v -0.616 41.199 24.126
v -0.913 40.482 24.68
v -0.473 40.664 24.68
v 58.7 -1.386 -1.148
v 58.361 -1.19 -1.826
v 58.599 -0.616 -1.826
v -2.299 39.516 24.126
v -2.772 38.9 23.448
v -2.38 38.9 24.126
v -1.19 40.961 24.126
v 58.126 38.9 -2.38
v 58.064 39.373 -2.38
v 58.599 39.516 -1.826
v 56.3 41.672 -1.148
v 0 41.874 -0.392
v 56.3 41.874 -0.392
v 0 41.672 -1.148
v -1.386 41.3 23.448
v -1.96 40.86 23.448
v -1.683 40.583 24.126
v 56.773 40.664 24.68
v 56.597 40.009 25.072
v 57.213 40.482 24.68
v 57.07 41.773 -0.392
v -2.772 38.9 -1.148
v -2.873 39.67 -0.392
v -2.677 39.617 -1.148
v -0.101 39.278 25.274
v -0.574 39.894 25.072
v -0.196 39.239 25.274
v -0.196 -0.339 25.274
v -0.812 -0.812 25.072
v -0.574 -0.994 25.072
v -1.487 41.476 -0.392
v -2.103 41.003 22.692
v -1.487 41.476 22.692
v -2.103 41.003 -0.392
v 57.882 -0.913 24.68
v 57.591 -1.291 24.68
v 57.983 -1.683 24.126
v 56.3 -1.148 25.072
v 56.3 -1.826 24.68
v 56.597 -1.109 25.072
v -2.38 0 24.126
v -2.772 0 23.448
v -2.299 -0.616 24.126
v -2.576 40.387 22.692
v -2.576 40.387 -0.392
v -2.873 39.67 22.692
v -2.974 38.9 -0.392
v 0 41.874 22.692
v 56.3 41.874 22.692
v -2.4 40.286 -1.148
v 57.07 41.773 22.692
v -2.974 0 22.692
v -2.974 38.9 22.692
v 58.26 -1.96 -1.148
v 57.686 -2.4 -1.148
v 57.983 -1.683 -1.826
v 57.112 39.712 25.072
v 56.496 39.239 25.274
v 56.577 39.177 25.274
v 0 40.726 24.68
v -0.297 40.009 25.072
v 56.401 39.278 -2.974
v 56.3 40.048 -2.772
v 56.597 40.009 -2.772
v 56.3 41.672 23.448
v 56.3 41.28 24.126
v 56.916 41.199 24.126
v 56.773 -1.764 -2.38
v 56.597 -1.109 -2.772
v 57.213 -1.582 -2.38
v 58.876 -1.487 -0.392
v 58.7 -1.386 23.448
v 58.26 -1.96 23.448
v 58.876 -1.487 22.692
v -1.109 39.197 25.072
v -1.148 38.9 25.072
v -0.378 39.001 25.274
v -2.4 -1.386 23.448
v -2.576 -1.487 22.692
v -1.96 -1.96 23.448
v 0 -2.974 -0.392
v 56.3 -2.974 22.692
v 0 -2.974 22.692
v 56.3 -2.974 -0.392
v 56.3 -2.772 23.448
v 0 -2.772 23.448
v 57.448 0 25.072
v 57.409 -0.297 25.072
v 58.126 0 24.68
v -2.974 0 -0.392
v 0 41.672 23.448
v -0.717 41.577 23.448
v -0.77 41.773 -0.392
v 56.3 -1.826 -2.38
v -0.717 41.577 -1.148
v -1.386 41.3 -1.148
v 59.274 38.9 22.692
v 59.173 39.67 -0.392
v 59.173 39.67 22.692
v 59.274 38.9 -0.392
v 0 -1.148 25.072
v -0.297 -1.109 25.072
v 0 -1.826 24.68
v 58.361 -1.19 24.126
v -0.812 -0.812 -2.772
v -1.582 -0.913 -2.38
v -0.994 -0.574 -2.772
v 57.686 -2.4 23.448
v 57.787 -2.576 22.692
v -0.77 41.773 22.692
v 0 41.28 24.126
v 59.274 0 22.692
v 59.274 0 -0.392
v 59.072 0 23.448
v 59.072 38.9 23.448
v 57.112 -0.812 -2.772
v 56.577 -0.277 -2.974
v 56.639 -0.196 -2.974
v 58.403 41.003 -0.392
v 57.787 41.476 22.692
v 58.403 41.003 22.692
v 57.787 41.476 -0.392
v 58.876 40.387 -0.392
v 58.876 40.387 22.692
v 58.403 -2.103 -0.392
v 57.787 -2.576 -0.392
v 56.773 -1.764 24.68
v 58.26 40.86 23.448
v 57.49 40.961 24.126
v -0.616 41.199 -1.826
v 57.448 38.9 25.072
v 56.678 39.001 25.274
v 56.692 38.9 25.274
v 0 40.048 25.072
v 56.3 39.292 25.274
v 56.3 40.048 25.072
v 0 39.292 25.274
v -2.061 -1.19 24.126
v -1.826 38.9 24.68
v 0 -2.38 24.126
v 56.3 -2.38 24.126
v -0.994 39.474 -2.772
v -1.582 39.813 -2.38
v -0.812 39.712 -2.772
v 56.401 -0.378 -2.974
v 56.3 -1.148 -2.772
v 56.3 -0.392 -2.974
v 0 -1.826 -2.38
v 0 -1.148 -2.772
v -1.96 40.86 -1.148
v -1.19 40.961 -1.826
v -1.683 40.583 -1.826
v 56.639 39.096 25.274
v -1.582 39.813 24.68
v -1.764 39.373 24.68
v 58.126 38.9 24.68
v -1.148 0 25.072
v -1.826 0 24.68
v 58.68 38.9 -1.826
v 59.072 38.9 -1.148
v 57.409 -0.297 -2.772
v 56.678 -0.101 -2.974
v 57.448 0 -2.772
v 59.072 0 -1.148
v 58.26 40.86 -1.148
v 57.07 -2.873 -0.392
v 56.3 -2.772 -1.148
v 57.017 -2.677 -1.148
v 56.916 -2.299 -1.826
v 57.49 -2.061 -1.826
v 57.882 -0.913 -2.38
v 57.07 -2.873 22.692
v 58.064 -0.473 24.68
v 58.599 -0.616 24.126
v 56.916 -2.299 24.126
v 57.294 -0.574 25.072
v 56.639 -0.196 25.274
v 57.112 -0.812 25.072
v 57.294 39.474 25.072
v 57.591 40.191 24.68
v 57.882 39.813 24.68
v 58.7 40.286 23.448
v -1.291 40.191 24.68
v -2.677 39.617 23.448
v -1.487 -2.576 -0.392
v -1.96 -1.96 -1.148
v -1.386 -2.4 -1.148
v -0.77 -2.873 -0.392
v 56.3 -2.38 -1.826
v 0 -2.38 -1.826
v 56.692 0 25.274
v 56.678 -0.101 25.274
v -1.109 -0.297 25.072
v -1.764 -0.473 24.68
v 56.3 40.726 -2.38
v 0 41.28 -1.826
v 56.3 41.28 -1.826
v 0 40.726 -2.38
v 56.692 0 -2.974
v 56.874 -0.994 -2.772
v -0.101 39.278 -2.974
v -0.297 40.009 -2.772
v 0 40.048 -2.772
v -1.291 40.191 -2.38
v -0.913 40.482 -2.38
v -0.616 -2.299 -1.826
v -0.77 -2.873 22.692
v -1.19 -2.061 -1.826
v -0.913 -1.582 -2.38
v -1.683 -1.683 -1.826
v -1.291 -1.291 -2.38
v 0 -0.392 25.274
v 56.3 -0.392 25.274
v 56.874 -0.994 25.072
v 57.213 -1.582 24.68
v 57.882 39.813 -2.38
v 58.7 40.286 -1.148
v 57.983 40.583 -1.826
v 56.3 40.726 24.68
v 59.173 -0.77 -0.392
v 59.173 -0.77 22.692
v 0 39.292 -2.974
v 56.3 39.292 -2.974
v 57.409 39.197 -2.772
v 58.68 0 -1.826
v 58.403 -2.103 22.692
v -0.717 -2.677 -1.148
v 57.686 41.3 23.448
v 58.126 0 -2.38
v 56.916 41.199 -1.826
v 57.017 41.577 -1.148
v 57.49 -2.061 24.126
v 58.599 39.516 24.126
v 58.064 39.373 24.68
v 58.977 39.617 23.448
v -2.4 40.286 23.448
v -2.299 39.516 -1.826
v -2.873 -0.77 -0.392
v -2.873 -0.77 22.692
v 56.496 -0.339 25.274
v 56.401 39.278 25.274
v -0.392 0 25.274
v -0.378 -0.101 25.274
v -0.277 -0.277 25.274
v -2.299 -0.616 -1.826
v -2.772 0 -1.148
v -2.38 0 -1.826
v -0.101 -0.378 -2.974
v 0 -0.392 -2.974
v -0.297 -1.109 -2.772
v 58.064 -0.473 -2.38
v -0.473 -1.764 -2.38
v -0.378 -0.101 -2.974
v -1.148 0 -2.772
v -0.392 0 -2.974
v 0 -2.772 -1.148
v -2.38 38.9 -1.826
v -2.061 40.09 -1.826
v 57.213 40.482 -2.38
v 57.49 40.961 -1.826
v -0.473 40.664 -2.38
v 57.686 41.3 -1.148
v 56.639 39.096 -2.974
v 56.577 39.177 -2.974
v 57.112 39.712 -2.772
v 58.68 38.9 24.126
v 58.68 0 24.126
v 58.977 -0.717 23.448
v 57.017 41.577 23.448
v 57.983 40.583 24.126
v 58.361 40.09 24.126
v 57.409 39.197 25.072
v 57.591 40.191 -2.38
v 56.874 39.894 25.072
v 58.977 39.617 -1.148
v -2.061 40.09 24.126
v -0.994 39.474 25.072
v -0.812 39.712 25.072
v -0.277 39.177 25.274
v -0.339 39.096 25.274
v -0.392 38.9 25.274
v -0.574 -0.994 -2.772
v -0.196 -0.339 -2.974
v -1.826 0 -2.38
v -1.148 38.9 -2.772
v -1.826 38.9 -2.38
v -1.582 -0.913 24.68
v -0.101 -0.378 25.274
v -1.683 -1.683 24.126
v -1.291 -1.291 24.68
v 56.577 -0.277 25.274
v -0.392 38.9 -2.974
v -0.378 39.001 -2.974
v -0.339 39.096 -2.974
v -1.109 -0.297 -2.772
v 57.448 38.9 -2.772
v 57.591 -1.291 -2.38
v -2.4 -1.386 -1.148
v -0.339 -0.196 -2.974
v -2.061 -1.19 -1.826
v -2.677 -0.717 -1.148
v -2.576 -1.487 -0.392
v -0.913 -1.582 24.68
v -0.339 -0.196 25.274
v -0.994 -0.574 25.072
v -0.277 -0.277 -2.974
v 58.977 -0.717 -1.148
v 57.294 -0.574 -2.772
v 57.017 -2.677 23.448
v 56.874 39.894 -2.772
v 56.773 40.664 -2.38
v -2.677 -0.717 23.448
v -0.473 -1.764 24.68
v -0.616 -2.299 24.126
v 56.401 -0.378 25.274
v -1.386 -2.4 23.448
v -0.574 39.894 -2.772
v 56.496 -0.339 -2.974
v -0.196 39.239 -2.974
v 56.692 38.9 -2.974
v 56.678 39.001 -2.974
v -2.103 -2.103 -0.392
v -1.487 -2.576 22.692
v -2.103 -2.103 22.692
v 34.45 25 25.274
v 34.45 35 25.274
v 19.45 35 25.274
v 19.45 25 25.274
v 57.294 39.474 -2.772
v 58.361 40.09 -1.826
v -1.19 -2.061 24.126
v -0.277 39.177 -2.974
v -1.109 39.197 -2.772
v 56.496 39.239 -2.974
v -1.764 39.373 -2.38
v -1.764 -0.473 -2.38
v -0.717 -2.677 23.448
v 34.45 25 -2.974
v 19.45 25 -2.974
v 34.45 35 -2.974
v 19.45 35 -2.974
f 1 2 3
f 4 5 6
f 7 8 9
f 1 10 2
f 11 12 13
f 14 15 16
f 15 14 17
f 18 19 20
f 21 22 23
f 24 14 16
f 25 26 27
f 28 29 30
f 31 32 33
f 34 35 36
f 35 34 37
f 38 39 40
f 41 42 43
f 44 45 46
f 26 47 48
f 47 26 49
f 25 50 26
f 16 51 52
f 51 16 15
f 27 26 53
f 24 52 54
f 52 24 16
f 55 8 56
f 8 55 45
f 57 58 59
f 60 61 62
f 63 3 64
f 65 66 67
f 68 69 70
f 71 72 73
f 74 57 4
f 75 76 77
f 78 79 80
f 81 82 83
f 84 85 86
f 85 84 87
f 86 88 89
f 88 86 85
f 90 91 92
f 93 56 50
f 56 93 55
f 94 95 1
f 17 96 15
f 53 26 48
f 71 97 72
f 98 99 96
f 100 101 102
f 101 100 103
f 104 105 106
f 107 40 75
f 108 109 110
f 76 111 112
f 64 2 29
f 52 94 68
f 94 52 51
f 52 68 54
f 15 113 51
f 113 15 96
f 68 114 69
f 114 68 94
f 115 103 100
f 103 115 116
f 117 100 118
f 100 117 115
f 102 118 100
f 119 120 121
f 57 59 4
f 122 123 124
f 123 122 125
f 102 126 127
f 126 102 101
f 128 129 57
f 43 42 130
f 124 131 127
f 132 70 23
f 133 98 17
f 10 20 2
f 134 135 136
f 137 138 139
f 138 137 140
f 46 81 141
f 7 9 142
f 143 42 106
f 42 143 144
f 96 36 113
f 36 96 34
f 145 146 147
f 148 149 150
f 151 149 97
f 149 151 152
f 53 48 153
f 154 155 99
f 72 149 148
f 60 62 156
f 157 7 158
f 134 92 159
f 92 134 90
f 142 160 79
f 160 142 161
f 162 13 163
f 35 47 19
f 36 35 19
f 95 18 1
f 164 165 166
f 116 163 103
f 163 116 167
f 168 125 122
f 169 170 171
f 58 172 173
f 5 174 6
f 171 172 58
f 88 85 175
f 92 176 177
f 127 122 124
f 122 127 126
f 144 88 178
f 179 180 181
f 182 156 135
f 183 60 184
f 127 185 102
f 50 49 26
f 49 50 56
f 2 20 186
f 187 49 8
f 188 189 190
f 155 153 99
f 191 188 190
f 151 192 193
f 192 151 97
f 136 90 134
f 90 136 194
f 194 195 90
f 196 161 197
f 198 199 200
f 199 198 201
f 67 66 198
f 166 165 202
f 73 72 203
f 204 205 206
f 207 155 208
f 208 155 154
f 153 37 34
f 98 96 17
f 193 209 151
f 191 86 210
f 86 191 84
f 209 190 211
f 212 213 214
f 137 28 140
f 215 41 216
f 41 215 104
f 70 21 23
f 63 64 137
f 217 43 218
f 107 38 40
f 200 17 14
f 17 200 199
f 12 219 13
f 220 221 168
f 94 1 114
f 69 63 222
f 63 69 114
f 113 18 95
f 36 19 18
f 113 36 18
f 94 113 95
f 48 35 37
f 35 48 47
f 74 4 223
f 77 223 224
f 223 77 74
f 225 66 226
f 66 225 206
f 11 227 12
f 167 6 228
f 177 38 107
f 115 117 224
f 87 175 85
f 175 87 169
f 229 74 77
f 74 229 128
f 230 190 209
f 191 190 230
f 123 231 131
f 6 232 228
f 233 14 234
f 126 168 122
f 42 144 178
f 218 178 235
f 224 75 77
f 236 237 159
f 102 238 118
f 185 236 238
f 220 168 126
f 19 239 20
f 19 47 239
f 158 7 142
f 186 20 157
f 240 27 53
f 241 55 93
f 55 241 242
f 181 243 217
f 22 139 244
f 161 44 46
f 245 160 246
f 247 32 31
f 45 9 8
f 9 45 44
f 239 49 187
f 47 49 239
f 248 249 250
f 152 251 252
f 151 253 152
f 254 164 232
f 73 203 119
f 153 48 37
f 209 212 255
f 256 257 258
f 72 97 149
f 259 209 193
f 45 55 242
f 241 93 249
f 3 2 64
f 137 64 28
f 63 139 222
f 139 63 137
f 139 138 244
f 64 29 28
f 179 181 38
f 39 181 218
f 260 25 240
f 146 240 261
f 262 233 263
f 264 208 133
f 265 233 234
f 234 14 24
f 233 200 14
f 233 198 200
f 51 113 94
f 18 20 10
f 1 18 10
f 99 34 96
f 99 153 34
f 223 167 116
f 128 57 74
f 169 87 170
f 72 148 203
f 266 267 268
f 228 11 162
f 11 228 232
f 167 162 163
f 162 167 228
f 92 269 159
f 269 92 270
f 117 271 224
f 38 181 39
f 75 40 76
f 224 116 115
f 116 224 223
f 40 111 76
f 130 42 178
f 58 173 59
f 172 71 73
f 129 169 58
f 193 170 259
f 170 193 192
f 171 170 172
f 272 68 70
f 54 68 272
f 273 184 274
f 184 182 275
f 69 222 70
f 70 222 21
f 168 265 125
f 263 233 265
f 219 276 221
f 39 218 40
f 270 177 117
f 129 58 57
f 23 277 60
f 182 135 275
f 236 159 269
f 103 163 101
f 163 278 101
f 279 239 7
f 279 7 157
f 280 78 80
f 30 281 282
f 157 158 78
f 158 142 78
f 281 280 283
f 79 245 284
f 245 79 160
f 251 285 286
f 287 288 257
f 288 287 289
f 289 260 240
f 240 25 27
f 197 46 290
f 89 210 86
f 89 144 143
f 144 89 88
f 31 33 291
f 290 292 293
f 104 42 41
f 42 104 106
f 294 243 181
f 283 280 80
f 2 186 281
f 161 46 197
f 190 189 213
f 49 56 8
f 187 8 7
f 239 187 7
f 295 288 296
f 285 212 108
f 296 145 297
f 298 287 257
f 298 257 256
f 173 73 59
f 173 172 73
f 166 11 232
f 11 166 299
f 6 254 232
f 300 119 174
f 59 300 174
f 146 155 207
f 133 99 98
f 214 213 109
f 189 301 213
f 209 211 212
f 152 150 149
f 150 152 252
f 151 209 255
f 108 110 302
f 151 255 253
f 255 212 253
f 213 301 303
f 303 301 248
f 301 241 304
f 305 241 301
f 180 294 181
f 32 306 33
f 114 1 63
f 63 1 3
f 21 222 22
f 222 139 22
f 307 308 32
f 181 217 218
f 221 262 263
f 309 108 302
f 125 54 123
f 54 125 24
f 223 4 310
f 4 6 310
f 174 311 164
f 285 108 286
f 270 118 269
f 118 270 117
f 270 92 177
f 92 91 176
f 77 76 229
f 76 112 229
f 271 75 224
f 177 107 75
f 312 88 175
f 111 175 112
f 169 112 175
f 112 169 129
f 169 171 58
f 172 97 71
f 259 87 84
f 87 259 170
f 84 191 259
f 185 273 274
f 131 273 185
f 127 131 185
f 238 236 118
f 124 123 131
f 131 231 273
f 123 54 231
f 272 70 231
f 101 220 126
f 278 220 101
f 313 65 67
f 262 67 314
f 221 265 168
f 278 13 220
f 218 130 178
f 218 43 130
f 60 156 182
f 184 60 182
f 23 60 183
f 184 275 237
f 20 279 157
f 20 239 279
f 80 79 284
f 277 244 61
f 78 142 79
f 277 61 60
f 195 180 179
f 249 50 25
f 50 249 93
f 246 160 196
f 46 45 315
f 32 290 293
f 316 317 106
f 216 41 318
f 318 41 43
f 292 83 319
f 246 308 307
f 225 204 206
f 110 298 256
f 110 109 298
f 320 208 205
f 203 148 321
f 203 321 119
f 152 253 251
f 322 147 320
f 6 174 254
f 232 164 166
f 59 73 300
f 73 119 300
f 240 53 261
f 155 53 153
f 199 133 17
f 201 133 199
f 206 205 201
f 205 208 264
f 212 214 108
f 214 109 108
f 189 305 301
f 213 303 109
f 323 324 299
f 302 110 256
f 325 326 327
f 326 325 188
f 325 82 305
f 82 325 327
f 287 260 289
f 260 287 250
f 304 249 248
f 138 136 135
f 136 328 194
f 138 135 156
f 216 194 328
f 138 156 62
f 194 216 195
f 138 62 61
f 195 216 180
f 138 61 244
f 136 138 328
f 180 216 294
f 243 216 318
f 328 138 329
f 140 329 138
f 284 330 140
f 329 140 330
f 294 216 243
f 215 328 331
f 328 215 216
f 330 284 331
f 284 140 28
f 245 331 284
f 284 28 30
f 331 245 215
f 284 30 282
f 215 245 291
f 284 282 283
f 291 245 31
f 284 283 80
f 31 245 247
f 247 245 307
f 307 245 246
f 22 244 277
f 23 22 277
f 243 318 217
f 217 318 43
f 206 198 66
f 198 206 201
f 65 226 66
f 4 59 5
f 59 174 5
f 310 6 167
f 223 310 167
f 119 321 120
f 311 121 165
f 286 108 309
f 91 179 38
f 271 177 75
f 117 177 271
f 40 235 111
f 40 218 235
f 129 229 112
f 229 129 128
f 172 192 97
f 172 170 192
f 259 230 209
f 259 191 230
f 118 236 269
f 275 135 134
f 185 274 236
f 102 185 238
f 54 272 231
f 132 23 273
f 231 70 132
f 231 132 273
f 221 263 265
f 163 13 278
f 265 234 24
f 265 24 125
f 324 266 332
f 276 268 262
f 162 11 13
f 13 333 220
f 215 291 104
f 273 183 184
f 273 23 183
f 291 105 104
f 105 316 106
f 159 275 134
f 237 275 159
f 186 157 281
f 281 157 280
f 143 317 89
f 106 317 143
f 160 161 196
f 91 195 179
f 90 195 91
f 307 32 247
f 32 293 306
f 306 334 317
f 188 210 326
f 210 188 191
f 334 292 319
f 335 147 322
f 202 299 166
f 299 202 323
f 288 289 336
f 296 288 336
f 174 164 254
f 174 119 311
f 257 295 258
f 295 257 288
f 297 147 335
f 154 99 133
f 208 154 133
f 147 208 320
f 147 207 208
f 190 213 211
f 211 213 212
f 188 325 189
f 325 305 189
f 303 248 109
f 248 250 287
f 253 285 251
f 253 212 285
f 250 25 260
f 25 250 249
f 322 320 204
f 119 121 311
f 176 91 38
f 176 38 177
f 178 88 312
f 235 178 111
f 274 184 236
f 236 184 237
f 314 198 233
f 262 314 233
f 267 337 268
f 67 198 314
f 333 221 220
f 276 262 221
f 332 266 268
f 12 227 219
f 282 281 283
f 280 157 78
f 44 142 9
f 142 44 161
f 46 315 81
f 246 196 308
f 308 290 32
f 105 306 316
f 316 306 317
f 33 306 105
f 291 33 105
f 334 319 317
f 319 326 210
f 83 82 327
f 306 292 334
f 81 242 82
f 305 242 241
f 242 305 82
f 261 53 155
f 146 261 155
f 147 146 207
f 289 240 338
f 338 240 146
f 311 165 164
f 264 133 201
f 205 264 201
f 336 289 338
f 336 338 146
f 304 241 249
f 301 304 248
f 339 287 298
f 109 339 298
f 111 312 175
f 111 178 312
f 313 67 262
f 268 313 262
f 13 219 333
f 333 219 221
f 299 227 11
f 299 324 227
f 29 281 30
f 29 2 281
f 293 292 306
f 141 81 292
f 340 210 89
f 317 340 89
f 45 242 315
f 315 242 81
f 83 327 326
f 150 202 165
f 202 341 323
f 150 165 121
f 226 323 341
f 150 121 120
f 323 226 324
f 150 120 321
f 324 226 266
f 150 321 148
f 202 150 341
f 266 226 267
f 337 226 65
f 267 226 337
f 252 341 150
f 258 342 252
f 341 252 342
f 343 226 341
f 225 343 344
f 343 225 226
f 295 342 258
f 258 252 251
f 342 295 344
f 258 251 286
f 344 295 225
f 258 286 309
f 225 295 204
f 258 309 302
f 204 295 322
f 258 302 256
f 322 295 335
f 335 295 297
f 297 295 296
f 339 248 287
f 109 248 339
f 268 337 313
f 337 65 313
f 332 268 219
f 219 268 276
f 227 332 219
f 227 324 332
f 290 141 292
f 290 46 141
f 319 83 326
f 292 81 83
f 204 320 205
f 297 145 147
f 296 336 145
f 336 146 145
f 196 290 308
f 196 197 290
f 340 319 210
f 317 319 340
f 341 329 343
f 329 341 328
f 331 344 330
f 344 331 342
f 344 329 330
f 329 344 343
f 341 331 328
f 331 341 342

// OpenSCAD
$fn=24;
r=3;
difference(){
minkowski(){
sphere(r);
cube([62.3-2*r,44.9-2*r,28.3-2*r]);
}
translate([22.45-r,25,-10])cube([15,10,100]);
}
